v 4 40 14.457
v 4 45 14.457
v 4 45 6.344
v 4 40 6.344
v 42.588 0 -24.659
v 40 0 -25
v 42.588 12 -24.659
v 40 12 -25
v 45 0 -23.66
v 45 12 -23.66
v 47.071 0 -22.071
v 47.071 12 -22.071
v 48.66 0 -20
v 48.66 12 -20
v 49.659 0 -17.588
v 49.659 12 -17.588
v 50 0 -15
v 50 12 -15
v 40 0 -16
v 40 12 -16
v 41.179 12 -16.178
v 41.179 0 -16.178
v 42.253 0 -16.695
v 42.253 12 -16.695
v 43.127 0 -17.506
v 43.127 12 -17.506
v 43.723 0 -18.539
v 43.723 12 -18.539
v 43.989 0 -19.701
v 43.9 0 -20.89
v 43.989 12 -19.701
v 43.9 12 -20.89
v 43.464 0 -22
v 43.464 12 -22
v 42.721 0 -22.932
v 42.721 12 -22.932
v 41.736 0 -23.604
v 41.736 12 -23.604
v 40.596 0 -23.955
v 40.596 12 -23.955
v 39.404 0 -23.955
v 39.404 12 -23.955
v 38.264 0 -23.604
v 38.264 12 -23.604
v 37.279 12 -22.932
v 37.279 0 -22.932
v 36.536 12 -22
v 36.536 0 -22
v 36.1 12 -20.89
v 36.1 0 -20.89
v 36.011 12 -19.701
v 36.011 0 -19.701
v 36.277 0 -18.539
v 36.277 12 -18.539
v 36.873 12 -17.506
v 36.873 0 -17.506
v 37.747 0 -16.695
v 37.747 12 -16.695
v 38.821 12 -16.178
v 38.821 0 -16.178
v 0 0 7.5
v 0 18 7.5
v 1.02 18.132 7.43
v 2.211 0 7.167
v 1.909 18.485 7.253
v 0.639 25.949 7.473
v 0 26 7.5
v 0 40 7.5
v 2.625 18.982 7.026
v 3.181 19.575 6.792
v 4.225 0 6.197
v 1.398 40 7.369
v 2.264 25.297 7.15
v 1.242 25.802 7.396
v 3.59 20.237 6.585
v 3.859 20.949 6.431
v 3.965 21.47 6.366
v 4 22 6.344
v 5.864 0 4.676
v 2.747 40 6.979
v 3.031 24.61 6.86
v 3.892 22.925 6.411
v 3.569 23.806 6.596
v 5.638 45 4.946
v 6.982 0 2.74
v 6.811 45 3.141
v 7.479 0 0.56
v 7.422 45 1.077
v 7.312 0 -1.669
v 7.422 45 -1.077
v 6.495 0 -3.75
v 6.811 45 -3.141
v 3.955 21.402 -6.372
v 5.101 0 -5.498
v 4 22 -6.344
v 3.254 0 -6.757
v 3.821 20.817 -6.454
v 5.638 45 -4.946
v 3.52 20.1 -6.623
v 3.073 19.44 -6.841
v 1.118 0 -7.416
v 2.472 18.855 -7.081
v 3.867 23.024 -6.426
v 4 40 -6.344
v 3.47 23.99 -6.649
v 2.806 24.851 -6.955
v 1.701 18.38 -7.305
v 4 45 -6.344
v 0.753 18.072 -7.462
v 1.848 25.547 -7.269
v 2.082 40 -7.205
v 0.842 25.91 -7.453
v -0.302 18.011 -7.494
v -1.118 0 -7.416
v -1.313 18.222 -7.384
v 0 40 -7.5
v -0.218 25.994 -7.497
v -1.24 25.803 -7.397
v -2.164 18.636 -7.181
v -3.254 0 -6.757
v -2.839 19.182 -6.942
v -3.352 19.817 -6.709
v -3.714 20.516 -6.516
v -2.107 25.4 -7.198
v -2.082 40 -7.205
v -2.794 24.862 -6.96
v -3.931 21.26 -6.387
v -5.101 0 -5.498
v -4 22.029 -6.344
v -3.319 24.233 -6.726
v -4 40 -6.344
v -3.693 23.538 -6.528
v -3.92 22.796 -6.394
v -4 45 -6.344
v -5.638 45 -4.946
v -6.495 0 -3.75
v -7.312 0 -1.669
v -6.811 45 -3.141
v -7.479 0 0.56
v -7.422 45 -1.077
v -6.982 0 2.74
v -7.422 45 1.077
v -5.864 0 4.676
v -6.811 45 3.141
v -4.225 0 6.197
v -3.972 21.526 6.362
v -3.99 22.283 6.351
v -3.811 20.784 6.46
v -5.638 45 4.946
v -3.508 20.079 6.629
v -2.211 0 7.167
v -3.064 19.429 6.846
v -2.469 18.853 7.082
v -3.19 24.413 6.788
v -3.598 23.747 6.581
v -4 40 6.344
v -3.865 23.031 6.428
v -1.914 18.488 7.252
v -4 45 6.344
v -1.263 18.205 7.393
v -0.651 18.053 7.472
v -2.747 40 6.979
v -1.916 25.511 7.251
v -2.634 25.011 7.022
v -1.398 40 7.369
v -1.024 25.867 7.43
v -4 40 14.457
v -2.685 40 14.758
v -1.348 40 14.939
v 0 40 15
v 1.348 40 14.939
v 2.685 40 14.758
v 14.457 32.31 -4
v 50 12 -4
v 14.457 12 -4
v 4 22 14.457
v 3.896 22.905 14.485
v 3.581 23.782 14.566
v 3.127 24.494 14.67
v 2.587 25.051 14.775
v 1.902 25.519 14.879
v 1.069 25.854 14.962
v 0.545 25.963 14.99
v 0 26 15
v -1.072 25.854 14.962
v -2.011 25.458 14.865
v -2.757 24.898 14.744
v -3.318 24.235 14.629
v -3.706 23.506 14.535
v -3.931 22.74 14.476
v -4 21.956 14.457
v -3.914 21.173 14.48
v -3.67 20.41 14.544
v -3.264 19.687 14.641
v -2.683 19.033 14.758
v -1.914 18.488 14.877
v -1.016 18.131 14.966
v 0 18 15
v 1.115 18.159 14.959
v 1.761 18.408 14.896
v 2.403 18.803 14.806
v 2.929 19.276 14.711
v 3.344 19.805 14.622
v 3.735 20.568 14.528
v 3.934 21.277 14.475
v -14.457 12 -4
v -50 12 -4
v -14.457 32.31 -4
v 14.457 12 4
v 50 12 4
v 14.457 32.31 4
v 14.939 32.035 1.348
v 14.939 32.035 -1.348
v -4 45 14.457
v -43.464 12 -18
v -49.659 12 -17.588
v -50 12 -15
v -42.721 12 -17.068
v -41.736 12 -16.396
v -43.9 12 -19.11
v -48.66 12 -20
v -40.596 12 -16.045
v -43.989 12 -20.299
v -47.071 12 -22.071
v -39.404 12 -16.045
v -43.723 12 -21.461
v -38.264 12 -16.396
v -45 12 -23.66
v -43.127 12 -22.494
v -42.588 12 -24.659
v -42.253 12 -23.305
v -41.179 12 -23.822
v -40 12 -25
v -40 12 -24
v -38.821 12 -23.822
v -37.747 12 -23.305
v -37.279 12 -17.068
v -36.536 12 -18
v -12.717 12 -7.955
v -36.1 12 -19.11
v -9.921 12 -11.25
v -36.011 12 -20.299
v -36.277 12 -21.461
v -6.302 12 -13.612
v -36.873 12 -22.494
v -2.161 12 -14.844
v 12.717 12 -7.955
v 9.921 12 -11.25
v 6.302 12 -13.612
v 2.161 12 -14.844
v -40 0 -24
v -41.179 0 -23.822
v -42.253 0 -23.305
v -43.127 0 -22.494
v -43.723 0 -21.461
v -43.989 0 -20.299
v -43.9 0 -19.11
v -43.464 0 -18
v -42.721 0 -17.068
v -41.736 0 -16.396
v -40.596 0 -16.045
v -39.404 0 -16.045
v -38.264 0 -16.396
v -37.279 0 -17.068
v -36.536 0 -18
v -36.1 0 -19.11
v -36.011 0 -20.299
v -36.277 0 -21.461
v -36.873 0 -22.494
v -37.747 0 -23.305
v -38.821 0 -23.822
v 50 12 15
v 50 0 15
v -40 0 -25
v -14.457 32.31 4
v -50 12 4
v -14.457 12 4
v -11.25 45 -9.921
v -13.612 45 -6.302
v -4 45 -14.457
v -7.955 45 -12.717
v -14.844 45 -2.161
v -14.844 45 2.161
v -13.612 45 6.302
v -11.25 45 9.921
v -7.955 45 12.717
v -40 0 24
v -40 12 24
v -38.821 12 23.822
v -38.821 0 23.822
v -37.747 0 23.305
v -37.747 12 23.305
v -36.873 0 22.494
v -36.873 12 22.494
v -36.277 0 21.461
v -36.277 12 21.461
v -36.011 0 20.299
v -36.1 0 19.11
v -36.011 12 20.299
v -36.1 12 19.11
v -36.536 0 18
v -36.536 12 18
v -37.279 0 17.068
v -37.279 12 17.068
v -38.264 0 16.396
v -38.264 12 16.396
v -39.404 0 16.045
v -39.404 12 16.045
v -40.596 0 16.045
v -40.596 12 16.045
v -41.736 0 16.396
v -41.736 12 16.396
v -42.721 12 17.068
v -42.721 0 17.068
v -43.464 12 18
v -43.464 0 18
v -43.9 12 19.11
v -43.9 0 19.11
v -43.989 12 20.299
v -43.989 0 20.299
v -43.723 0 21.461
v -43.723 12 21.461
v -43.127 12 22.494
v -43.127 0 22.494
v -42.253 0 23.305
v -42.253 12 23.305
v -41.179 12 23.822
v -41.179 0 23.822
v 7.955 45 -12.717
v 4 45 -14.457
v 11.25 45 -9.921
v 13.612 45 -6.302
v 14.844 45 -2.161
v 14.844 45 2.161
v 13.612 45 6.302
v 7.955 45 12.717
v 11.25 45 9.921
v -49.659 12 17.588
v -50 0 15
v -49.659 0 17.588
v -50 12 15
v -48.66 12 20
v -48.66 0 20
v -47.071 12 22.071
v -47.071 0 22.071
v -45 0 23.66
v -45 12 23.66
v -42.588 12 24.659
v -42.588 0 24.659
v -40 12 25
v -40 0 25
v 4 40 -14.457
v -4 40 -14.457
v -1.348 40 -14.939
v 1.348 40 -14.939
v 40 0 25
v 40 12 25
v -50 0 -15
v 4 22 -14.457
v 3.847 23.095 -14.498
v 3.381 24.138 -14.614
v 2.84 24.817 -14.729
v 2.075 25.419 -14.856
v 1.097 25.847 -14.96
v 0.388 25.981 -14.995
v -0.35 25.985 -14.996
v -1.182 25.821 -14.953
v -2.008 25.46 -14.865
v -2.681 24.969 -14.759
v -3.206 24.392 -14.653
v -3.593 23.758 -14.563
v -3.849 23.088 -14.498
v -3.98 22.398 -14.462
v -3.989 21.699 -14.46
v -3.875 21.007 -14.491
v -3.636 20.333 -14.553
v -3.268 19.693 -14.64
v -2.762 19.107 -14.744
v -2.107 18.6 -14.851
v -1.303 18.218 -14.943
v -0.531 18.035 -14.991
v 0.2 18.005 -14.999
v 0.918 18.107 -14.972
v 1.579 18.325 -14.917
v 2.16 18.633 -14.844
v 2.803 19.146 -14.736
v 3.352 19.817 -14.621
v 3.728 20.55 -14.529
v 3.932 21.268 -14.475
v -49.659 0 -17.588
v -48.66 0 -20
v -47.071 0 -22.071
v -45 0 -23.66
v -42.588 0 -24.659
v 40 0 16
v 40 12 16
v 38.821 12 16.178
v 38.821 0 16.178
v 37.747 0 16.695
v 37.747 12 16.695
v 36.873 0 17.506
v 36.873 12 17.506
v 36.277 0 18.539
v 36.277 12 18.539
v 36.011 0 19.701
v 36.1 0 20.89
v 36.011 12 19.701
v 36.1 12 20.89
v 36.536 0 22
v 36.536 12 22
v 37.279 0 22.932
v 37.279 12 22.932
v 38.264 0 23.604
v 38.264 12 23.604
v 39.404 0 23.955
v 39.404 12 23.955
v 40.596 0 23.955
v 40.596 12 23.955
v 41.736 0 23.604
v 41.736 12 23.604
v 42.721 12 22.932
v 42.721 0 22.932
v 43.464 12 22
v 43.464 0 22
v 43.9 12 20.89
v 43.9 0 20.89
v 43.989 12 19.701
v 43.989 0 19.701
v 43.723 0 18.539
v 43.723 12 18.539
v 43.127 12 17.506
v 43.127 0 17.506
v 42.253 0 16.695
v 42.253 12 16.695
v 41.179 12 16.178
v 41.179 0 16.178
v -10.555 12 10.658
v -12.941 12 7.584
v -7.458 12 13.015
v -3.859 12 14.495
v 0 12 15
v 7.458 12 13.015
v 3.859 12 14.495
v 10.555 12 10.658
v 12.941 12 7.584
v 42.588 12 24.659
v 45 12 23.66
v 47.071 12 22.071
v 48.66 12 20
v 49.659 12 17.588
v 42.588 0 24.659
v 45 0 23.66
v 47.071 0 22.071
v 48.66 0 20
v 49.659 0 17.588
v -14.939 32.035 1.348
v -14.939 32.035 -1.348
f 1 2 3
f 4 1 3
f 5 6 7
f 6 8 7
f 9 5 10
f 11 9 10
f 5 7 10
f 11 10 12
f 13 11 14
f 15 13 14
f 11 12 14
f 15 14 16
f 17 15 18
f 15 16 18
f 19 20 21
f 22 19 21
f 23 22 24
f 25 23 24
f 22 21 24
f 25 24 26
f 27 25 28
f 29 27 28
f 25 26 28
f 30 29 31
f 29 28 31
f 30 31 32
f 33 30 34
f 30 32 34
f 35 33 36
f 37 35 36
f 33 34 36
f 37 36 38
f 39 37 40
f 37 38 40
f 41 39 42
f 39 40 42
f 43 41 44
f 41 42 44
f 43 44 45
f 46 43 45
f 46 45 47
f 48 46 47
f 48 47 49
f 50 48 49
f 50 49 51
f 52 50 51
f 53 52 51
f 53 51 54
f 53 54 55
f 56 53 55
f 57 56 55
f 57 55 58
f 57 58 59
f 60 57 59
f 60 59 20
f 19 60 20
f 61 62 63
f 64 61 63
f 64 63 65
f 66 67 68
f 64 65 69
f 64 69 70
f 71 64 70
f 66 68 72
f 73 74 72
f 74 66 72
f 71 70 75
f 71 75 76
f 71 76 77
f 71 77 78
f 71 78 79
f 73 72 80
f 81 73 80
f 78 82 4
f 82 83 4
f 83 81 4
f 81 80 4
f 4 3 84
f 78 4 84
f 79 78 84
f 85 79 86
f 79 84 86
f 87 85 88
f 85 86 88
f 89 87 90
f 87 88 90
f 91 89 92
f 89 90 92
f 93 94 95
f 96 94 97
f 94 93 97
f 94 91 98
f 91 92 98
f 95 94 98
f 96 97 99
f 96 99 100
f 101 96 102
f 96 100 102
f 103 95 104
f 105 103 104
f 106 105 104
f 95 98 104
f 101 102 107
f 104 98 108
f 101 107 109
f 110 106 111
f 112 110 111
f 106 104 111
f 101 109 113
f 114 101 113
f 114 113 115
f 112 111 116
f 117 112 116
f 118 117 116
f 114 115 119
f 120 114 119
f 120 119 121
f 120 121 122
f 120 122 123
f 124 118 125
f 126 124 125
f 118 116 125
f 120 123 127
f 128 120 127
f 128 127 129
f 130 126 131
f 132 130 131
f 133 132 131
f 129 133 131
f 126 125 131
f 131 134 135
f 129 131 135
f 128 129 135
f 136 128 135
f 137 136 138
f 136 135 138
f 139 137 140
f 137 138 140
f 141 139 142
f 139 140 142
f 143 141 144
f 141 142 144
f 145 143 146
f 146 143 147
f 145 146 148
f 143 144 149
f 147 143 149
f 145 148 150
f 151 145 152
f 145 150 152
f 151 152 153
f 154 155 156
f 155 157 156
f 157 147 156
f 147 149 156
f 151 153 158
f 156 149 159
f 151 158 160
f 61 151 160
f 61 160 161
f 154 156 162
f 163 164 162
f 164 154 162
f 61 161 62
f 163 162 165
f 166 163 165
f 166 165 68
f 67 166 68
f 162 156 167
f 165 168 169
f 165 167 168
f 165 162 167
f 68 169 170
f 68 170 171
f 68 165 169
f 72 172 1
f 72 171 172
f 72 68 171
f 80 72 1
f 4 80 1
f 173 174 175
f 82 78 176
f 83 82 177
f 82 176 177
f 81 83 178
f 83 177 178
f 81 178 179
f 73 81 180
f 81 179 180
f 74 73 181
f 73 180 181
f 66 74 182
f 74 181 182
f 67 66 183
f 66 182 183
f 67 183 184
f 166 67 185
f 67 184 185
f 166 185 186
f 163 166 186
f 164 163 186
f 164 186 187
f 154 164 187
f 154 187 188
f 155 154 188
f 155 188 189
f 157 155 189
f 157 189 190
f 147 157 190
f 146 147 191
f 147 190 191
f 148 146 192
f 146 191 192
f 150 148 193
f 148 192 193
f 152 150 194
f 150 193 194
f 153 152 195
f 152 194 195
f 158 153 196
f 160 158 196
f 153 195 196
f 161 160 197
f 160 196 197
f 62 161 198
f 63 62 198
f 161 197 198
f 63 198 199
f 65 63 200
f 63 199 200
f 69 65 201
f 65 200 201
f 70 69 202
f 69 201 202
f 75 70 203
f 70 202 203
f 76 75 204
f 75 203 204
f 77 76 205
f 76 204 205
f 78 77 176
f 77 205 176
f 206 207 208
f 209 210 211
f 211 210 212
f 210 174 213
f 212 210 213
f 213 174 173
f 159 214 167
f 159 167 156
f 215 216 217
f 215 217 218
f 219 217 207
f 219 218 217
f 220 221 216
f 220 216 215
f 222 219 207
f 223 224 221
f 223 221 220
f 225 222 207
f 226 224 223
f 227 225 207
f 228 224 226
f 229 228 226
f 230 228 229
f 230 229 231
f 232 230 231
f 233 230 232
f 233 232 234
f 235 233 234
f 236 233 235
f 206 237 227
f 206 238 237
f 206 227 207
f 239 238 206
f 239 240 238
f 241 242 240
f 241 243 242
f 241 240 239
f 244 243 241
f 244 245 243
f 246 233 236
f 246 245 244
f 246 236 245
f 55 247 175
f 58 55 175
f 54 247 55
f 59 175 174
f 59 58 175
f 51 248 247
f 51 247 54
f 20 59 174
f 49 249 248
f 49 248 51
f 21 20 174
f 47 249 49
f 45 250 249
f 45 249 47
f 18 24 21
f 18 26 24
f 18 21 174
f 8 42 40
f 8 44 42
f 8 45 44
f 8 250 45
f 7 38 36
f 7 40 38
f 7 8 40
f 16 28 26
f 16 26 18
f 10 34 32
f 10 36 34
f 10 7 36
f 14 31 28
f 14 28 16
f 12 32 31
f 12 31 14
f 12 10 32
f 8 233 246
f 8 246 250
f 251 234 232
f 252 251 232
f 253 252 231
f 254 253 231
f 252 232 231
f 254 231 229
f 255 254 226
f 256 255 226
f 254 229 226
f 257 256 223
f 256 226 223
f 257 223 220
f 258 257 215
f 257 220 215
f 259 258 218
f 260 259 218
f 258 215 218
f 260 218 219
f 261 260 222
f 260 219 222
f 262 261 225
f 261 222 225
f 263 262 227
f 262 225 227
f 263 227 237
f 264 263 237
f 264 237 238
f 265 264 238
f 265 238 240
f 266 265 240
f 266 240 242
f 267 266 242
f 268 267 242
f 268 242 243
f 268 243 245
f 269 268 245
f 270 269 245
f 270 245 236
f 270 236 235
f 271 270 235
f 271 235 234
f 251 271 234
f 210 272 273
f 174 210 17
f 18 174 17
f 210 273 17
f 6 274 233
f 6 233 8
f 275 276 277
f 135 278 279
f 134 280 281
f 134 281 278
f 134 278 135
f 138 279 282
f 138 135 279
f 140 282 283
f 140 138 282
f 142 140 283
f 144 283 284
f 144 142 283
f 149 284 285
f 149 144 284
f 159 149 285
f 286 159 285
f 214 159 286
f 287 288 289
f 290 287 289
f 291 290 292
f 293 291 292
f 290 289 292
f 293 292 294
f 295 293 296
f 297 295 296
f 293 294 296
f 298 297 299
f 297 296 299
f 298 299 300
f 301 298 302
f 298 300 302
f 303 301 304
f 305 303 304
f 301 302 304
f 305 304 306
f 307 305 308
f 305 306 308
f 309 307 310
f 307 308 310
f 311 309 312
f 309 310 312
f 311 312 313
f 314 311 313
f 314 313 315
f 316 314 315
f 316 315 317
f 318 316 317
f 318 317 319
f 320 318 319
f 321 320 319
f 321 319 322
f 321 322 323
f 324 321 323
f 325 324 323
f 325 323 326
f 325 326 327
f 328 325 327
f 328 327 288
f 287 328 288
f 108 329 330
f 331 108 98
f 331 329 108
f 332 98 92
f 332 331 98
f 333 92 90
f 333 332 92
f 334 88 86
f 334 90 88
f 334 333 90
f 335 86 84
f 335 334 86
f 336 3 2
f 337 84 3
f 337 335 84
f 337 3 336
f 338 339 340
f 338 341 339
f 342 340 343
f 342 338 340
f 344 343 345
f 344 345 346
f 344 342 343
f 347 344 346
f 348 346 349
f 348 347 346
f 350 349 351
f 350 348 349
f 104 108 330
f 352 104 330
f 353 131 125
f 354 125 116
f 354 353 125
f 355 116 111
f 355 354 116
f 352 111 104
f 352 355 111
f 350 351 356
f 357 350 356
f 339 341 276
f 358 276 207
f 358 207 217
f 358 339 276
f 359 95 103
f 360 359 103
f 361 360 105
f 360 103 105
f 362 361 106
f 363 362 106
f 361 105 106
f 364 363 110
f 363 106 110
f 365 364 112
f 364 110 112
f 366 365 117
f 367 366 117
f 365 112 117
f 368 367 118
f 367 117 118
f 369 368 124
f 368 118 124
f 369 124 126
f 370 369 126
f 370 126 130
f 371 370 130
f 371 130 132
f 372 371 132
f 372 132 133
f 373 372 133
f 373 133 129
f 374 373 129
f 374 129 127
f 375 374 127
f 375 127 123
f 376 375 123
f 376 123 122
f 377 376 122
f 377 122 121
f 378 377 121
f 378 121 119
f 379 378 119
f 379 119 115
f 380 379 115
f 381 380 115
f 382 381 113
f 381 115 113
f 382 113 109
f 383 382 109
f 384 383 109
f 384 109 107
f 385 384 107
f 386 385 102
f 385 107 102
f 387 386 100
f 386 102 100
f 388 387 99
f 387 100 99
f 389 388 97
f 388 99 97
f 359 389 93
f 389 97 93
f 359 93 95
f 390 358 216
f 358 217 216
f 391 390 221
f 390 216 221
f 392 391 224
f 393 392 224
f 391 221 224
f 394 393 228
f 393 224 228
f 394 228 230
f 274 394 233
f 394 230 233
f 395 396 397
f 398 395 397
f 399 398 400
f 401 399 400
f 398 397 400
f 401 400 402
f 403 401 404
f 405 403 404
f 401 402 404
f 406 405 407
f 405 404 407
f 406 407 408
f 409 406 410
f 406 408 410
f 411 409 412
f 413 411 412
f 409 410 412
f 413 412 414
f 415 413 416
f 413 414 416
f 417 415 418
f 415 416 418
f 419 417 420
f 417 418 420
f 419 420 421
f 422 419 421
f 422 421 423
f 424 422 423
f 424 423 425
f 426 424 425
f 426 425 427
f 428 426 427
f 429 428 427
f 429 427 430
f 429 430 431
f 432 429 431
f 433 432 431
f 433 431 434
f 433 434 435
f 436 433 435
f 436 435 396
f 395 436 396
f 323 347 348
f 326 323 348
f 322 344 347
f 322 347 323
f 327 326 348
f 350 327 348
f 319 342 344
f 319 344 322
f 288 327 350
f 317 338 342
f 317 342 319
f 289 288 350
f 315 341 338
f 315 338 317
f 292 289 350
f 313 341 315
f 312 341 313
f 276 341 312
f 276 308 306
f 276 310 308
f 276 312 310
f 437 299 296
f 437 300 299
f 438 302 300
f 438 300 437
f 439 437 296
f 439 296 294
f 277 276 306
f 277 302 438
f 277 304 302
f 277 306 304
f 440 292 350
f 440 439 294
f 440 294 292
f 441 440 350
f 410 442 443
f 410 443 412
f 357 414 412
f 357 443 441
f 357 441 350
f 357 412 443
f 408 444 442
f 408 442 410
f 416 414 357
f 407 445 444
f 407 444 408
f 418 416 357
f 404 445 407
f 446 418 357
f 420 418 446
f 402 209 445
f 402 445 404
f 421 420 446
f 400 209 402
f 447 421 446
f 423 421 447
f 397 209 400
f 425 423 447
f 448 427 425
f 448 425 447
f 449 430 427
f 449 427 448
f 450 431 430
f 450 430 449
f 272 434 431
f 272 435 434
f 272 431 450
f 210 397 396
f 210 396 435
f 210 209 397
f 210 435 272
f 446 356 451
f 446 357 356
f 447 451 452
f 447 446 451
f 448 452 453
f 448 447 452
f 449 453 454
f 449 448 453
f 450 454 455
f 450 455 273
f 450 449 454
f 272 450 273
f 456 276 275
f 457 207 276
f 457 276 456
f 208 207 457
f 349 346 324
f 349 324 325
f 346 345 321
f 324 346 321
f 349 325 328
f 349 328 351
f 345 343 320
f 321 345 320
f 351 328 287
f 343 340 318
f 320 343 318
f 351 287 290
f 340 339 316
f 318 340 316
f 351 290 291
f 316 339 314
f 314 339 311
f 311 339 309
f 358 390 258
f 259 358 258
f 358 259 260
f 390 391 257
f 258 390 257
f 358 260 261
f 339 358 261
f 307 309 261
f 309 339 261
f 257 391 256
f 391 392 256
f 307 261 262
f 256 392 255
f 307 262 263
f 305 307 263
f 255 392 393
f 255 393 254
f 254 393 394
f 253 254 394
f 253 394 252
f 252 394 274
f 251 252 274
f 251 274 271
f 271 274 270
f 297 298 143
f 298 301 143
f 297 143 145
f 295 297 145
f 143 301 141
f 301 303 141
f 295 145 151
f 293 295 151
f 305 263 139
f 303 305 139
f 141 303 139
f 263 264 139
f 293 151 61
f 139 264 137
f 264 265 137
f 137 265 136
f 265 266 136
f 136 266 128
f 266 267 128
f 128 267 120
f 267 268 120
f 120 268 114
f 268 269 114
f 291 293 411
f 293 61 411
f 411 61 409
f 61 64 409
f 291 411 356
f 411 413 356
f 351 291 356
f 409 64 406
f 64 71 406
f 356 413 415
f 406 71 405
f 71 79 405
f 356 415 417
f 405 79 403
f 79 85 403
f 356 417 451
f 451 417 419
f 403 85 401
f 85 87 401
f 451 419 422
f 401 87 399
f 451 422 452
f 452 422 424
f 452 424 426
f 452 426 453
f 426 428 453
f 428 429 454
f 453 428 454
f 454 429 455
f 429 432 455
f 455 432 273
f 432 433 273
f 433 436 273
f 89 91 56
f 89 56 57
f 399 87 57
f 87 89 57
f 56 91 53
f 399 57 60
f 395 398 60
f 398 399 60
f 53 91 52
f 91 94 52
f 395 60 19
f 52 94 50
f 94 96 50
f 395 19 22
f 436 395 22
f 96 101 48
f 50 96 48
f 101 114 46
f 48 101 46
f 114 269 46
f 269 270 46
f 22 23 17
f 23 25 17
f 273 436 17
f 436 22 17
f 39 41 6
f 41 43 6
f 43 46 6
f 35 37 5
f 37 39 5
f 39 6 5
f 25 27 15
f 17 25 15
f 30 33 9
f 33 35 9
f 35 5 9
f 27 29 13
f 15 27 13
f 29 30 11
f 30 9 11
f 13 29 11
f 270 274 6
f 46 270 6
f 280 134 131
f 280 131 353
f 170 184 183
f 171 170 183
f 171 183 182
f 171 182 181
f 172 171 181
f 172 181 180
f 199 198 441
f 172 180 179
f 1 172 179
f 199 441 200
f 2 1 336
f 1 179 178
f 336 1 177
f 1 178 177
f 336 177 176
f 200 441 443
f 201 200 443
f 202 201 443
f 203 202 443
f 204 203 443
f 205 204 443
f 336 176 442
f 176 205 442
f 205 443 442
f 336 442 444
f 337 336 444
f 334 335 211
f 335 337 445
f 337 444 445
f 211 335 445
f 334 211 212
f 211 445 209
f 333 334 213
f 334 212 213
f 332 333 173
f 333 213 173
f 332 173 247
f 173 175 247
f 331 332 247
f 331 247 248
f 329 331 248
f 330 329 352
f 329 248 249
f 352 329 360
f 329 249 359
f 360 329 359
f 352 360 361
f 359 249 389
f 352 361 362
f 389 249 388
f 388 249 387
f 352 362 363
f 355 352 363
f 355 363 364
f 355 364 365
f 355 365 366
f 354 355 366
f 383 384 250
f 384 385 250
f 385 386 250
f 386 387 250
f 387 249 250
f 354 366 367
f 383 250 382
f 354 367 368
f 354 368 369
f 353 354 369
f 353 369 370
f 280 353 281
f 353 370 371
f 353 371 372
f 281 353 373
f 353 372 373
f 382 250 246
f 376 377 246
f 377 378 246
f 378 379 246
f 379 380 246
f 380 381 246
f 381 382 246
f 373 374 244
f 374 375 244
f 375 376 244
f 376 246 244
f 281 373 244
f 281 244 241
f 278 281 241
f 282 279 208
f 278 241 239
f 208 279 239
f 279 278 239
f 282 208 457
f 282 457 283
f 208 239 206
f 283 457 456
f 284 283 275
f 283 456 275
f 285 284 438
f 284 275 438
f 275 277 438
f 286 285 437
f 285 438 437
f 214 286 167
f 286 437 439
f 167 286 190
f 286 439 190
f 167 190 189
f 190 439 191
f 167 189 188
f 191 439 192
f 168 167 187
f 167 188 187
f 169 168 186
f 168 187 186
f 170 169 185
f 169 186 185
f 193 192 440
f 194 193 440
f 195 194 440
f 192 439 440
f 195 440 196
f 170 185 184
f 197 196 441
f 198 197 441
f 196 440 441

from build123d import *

# Parameters (mm, degrees)
SKETCH_1_W          = 100
SKETCH_1_H          = 50
EXTRUDE_1_DEPTH     = 12
SKETCH_2_R          = 4
CUT_EXTRUDE_1_DEPTH = 58.175169436
SKETCH_3_R          = 15
EXTRUDE_2_DEPTH     = 33
SKETCH_4_R          = 7.5
CUT_EXTRUDE_2_DEPTH = 72.763500472
SKETCH_5_W          = 8
SKETCH_5_H          = 30
CUT_EXTRUDE_3_DEPTH = 5
FILLET_2_R          = 10
FILLET_3_R          = 10
RIB_30_REACH        = 73.764
SKETCH_11_WALL_W    = 185.838289686
SKETCH_11_WALL_H    = 8
RIB_31_REACH        = 73.764
SKETCH_15_WALL_W    = 185.838289686
SKETCH_15_WALL_H    = 8
SKETCH_16_R         = 4
CUT_EXTRUDE_4_DEPTH = 79.262379212


with BuildPart() as part:
    # 草图1 → 凸台-拉伸1 (new body)
    with BuildSketch(Plane(origin=(0, 0, 0), x_dir=(1, 0, 0), z_dir=(0, 1, 0))):
        Rectangle(SKETCH_1_W, SKETCH_1_H)
    extrude(amount=EXTRUDE_1_DEPTH)

    # 草图2 → 切除-拉伸1 (cut, through all)
    with BuildSketch(Plane(origin=(0, 12, 0), x_dir=(1, 0, 0), z_dir=(0, 1, 0))):
        with Locations((-40, -20)):
            Circle(SKETCH_2_R)
        with Locations((-40, 20)):
            Circle(SKETCH_2_R)
        with Locations((40, -20)):
            Circle(SKETCH_2_R)
        with Locations((40, 20)):
            Circle(SKETCH_2_R)
    extrude(amount=-CUT_EXTRUDE_1_DEPTH, mode=Mode.SUBTRACT)

    # 草图3 → 凸台-拉伸2 (add)
    with BuildSketch(Plane(origin=(0, 12, 0), x_dir=(1, 0, 0), z_dir=(0, 1, 0))):
        Circle(SKETCH_3_R)
    extrude(amount=EXTRUDE_2_DEPTH)

    # 草图4 → 切除-拉伸2 (cut, through all)
    with BuildSketch(Plane(origin=(0, 45, 0), x_dir=(1, 0, 0), z_dir=(0, 1, 0))):
        Circle(SKETCH_4_R)
    extrude(amount=-CUT_EXTRUDE_2_DEPTH, mode=Mode.SUBTRACT)

    # 草图5 → 切除-拉伸3 (cut)
    with BuildSketch(Plane(origin=(0, 45, 0), x_dir=(1, 0, 0), z_dir=(0, 1, 0))):
        Rectangle(SKETCH_5_W, SKETCH_5_H)
    extrude(amount=-CUT_EXTRUDE_3_DEPTH, mode=Mode.SUBTRACT)

    # 圆角2
    fillet_2_edges = [part.edges().sort_by_distance(p)[0] for p in [
        (-50, 6, -25),
        (-50, 6, 25),
    ]]
    fillet(fillet_2_edges, radius=FILLET_2_R)

    # 圆角3
    fillet_3_edges = [part.edges().sort_by_distance(p)[0] for p in [
        (50, 6, 25),
        (50, 6, -25),
    ]]
    fillet(fillet_3_edges, radius=FILLET_3_R)

    # 草图11 wall → 筋30 (add, up to next)
    with BuildSketch(Plane(origin=(-32.5, 22, 0), x_dir=(0.868243142124, 0.496138938357, 0), z_dir=(-0.496138938357, 0.868243142124, 0)), mode=Mode.PRIVATE) as rib_30_sk1:
        Rectangle(SKETCH_11_WALL_W, SKETCH_11_WALL_H)
    rib_30_tool1 = extrude(rib_30_sk1.sketch, amount=-RIB_30_REACH, mode=Mode.PRIVATE) - part.part
    add(rib_30_tool1.solids().sort_by_distance((-32.5, 22, 0))[0])

    # 草图15 wall → 筋31 (add, up to next)
    with BuildSketch(Plane(origin=(32.5, 22, 0), x_dir=(-0.868243142124, 0.496138938357, 0), z_dir=(-0.496138938357, -0.868243142124, 0)), mode=Mode.PRIVATE) as rib_31_sk1:
        Rectangle(SKETCH_15_WALL_W, SKETCH_15_WALL_H)
    rib_31_tool1 = extrude(rib_31_sk1.sketch, amount=RIB_31_REACH, mode=Mode.PRIVATE) - part.part
    add(rib_31_tool1.solids().sort_by_distance((32.5, 22, 0))[0])

    # 草图16 → 切除-拉伸4 (cut, through all)
    with BuildSketch(Plane.XY.offset(15)):
        with Locations((0, 22)):
            Circle(SKETCH_16_R)
    extrude(amount=-CUT_EXTRUDE_4_DEPTH, mode=Mode.SUBTRACT)


solid = part.part
